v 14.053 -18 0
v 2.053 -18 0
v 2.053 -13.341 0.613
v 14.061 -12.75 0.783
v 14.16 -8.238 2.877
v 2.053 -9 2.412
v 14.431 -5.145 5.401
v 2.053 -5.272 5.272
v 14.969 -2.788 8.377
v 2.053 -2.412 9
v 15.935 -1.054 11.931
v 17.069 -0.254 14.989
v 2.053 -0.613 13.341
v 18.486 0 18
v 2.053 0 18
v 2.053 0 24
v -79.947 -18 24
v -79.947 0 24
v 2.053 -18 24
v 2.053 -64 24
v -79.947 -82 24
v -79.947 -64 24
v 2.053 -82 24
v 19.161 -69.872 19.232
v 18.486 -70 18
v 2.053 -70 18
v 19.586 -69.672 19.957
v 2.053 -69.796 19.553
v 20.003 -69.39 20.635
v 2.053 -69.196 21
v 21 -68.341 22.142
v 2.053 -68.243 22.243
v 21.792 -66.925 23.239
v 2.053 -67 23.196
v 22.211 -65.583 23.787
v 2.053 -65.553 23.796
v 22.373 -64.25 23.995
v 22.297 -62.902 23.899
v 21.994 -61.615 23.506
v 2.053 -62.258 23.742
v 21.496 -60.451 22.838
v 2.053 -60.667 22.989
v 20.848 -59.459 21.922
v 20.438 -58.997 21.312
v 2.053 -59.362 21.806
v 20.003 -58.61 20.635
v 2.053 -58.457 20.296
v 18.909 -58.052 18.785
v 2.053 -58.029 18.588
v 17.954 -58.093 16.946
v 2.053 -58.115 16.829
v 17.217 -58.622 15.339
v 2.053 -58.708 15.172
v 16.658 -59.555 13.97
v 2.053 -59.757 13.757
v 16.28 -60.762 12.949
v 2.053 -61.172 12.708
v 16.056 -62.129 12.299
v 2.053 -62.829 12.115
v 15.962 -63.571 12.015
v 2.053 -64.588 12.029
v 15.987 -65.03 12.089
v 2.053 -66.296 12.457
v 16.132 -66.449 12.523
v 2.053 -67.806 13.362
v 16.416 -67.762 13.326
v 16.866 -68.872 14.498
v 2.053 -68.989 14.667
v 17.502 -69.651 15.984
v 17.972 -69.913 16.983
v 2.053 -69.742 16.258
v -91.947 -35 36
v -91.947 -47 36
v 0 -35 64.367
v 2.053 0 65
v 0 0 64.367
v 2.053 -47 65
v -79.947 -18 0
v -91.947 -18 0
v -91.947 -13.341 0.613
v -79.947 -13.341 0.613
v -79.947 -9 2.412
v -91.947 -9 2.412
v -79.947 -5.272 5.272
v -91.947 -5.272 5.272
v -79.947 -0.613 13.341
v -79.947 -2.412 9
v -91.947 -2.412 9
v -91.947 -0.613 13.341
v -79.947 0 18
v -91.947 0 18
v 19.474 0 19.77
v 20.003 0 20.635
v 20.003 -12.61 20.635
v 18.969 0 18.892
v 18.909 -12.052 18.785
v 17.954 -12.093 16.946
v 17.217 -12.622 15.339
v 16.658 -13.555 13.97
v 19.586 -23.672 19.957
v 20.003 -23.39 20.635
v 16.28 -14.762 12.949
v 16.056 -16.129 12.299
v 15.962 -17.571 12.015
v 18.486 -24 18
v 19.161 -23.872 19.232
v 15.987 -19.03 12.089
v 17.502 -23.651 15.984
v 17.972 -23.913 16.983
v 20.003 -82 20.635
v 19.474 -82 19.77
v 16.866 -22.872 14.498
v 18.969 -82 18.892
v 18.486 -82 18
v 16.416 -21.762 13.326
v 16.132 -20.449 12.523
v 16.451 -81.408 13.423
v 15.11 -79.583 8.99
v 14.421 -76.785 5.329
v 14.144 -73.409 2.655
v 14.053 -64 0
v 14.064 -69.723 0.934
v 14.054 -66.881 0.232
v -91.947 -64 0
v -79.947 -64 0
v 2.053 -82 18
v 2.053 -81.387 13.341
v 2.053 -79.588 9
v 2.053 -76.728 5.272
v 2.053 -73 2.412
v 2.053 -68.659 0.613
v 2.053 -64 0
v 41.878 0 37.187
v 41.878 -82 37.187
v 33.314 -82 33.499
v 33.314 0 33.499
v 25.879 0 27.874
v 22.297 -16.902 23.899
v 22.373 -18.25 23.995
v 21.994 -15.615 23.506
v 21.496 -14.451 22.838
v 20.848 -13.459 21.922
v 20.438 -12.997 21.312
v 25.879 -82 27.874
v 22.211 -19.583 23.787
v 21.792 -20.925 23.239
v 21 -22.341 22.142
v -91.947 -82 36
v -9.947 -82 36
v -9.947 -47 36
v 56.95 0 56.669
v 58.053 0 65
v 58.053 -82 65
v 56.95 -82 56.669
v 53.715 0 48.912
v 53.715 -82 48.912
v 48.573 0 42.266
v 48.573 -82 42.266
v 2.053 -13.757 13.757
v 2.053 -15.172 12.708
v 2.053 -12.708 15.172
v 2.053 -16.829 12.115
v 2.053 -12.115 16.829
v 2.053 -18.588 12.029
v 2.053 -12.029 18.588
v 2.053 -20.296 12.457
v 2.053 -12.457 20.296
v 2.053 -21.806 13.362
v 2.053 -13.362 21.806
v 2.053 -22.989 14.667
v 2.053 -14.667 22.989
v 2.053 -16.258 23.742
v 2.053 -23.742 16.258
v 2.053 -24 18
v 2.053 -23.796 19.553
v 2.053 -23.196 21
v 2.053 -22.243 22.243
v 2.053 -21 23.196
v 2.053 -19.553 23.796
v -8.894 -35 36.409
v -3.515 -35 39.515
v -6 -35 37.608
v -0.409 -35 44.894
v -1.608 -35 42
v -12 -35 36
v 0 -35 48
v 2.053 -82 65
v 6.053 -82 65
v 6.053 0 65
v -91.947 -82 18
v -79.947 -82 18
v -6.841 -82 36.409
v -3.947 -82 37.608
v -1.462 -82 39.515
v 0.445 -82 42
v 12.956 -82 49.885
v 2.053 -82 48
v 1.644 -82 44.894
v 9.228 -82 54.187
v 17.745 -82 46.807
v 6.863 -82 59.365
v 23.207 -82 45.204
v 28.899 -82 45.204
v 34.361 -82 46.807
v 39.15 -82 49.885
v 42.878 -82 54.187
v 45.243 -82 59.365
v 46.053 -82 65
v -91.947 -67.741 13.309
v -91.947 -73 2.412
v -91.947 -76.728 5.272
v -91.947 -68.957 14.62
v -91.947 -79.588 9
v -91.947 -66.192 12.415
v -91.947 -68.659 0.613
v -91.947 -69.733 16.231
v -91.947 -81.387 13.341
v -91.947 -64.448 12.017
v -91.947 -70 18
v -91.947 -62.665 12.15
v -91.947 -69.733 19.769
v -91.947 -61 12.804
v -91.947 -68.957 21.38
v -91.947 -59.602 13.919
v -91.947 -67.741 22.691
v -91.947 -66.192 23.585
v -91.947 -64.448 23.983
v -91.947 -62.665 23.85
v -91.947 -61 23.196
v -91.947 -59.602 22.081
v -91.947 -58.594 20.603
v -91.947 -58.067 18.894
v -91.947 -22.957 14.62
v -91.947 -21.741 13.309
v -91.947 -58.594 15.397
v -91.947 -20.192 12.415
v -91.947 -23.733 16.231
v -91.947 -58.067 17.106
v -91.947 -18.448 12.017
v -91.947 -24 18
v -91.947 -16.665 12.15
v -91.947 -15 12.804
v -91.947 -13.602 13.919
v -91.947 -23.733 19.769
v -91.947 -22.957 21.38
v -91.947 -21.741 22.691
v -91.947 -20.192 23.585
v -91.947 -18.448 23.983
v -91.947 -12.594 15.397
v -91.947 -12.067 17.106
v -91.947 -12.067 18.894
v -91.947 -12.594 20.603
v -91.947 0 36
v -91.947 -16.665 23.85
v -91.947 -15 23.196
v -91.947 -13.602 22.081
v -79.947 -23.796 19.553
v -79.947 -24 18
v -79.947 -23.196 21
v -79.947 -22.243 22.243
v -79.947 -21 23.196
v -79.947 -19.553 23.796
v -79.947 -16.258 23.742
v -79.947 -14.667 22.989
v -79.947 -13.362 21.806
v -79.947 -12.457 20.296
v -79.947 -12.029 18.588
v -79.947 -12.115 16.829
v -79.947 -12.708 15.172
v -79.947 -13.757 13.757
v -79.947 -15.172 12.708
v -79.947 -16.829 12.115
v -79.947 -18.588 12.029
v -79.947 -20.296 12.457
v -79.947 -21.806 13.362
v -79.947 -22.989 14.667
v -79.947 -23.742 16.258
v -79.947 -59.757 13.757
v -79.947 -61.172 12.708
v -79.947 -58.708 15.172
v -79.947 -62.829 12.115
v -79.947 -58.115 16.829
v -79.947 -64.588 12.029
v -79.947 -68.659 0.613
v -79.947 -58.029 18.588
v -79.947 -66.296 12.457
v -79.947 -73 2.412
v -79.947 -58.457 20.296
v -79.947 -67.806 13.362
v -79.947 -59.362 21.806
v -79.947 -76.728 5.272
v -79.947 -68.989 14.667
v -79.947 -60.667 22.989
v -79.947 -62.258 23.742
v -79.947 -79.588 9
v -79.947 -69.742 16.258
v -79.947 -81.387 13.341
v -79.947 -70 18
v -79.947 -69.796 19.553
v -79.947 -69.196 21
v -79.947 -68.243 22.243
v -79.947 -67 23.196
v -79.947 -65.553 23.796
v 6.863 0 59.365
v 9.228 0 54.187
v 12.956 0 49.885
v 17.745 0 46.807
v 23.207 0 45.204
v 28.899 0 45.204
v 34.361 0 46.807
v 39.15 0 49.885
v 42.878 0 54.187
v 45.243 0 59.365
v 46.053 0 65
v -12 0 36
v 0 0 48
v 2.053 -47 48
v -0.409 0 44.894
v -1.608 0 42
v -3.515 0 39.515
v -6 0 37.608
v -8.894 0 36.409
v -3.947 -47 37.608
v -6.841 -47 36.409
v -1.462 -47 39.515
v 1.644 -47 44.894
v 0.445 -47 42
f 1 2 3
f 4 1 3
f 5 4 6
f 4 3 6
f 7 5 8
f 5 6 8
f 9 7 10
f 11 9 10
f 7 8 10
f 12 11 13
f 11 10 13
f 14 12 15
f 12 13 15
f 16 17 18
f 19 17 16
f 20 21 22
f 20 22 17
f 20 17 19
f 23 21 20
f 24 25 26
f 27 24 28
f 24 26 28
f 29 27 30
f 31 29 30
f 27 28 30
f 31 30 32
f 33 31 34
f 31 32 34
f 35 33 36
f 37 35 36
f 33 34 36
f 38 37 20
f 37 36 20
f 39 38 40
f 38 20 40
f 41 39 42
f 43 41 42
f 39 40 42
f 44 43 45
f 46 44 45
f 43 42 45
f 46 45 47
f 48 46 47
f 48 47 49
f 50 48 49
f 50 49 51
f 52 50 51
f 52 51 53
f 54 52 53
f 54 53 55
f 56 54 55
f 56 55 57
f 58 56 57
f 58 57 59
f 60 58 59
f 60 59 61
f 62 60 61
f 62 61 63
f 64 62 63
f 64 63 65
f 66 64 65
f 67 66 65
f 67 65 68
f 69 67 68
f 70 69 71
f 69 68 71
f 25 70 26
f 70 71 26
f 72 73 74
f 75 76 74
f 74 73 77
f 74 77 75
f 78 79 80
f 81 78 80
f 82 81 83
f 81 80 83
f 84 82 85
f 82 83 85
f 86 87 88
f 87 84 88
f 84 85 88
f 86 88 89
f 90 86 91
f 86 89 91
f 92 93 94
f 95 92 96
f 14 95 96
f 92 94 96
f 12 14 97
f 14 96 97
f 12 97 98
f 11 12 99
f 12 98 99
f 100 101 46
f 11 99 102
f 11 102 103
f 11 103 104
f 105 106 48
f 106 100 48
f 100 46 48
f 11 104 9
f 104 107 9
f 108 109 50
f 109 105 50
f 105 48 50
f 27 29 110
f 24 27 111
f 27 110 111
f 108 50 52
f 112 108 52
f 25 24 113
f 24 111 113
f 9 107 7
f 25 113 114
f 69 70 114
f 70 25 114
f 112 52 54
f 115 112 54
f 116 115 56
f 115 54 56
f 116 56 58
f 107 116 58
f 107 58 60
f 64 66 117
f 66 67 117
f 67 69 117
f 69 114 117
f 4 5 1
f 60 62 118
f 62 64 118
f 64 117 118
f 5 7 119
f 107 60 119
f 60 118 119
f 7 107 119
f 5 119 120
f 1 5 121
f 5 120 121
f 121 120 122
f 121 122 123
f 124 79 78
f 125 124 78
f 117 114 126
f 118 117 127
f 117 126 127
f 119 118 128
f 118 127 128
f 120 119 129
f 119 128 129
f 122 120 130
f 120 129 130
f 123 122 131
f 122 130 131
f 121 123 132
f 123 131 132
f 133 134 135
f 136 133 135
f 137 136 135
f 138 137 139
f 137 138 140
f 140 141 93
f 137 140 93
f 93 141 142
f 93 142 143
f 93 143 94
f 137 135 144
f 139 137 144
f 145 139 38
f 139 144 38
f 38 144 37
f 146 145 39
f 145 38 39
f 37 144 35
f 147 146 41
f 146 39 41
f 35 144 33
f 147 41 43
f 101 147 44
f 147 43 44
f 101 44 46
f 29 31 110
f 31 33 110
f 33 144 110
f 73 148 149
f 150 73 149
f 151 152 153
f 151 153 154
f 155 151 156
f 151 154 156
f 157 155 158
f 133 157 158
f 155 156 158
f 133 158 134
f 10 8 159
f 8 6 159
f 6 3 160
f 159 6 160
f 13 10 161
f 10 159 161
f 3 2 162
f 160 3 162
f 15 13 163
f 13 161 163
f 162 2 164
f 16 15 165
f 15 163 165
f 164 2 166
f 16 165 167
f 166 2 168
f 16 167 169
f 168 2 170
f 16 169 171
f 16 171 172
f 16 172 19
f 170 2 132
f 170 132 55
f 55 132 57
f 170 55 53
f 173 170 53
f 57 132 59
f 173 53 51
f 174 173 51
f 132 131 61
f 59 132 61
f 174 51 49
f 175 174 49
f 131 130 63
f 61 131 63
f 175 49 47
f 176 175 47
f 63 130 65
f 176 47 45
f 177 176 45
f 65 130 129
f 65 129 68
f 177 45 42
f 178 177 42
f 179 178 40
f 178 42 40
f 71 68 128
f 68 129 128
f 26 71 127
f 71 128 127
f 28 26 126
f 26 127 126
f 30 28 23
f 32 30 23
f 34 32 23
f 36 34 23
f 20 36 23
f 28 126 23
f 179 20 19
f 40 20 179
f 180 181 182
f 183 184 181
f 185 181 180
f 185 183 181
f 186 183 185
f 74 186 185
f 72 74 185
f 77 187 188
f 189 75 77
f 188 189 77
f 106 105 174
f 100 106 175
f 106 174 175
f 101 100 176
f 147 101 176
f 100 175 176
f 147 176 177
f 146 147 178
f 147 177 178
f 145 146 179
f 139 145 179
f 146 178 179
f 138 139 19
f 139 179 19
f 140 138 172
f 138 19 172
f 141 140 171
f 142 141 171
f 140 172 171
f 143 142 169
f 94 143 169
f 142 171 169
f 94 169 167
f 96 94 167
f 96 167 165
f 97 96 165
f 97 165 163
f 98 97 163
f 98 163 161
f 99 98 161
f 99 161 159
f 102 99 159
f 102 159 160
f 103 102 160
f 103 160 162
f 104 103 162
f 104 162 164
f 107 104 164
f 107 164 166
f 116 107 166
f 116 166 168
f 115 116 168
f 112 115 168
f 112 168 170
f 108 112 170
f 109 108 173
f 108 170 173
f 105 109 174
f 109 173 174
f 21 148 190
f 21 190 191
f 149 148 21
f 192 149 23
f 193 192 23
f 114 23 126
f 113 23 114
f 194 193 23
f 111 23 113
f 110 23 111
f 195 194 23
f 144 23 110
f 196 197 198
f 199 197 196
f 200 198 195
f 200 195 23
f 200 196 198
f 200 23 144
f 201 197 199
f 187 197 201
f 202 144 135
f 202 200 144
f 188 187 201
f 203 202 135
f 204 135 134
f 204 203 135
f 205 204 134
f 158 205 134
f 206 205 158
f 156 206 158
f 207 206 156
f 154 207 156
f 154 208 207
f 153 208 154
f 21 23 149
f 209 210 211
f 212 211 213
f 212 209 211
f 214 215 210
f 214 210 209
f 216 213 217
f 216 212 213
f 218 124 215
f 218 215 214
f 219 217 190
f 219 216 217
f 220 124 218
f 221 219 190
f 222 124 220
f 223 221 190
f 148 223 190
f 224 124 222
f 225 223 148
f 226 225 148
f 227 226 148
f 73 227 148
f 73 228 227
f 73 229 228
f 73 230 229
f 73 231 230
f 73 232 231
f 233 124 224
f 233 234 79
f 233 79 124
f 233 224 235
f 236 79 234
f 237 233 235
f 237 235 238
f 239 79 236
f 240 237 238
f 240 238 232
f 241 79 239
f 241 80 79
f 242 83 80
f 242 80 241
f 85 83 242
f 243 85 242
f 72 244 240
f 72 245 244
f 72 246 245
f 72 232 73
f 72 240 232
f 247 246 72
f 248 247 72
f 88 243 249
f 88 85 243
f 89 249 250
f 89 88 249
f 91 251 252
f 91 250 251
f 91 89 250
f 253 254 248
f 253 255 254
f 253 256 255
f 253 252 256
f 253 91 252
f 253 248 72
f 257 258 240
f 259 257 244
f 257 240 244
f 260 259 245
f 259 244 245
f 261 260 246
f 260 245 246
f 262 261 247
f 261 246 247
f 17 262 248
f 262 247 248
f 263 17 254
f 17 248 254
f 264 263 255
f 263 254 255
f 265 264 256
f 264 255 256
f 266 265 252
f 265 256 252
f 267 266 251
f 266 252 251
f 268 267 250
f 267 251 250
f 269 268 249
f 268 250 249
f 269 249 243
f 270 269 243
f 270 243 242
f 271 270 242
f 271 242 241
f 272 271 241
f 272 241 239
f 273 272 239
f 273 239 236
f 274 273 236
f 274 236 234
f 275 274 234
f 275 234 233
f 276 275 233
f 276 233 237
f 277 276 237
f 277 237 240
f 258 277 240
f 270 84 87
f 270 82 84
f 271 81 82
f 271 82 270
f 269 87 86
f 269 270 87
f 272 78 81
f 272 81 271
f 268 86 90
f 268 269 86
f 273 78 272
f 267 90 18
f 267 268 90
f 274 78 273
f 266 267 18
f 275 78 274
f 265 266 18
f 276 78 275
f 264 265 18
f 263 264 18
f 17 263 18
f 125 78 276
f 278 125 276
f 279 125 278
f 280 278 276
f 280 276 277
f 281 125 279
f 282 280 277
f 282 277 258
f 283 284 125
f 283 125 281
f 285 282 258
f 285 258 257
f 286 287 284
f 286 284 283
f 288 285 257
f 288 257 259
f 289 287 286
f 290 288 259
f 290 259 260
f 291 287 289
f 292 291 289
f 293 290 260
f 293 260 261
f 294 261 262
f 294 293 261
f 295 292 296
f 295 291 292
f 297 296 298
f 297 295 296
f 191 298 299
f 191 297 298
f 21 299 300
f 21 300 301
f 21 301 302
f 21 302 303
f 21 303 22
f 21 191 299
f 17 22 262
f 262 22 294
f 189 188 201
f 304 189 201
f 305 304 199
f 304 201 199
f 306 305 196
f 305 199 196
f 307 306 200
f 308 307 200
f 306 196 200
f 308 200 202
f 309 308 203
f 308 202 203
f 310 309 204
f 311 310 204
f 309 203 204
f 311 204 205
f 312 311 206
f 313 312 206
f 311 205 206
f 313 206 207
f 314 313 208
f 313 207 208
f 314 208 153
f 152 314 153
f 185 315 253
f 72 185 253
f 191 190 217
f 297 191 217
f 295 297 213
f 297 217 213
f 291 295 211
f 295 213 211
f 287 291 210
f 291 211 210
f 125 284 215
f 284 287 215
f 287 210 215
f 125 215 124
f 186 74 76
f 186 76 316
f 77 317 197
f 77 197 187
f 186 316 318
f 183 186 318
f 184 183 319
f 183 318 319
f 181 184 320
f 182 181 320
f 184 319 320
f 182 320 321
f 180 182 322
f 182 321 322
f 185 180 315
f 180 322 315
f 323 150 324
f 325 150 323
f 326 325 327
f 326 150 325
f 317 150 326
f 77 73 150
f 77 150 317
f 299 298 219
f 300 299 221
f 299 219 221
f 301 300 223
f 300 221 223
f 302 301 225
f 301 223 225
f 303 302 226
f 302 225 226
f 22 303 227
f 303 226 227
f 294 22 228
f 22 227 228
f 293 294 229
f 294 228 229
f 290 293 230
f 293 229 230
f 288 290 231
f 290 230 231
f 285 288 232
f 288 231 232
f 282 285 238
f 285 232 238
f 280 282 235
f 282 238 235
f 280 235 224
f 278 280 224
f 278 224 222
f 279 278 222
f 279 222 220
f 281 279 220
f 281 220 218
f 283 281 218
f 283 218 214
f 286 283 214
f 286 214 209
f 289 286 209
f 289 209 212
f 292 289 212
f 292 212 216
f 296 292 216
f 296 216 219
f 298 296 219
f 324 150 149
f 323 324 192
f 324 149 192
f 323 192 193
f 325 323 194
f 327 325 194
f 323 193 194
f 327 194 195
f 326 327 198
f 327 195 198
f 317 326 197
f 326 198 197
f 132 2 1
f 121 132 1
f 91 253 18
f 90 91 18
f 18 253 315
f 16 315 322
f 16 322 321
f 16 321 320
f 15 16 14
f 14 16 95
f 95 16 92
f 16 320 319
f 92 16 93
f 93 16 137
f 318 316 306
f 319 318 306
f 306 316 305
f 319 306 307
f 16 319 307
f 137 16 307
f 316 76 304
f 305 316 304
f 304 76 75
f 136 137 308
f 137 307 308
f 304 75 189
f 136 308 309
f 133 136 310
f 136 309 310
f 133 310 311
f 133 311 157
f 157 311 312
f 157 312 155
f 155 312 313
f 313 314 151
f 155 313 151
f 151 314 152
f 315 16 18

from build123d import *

# Parameters (mm, degrees)
F0_W      = 150
F0_H      = 65
F1_DEPTH  = 82
F10_W     = 82
F10_H     = 24
F2_DEPTH  = 82
F3_DEPTH  = 82
F4_DEPTH  = 82
F5_DEPTH  = 35
F7_DEPTH  = 35
F8_R      = 6
F12_R     = 6
F13_DEPTH = 150
F14_DEPTH = 150
F9_DEPTH  = 82


# Not quite as in the source:
# - a feature names something its author has since deleted; it is built from what else it names


with BuildPart() as f1:
    # F0 (on Front) → F1 (new body)
    with BuildSketch(Plane.XZ):
        with Locations((-16.9468223028, 32.5)):
            Rectangle(F0_W, F0_H)
    extrude(amount=F1_DEPTH)

    # F10 (on face) → F2 (cut)
    with BuildSketch(Plane.XZ.offset(82)):
        with BuildLine():
            ThreePointArc((20.002534413, 20.6353670047), (15.5702030299, 10.7379376133), (14.0531776972, 0))
            Line((14.0531776972, 0), (58.0531776972, 0))
            Line((58.0531776972, 0), (58.0531776972, 65))
            ThreePointArc((58.0531776972, 65), (53.7152597827, 48.9124515634), (41.8776017786, 37.1865571621))
            ThreePointArc((41.8776017786, 37.1865571621), (37.6930401765, 19.9858202792), (20.002534413, 20.6353670047))
        make_face()
        with Locations((-38.9468223028, 12)):
            Rectangle(F10_W, F10_H)
    extrude(amount=-F2_DEPTH, mode=Mode.SUBTRACT)

    # F11 (on face) → F3 (cut)
    with BuildSketch(Plane.XZ.offset(82)):
        Polygon((-91.9468223028, 36), (2.0531776972, 65), (-91.9468223028, 65), align=None)
    extrude(amount=-F3_DEPTH, mode=Mode.SUBTRACT)

    # F11 (on face) → F4 (cut)
    with BuildSketch(Plane.XZ.offset(82)):
        Polygon((-91.9468223028, 36), (2.0531776972, 65), (-91.9468223028, 65), align=None)
    extrude(amount=-F4_DEPTH, mode=Mode.SUBTRACT)

    # F11 (on face) → F5 (cut)
    with BuildSketch(Plane.XZ.offset(82)):
        with BuildLine():
            Line((2.0531776972, 48), (2.0531776972, 65))
            Line((2.0531776972, 65), (-91.9468223028, 36))
            Line((-91.9468223028, 36), (-9.9468223028, 36))
            ThreePointArc((-9.9468223028, 36), (-1.4615409285, 39.5147186258), (2.0531776972, 48))
        make_face()
    extrude(amount=-F5_DEPTH, mode=Mode.SUBTRACT)

    # F6 (on face) → F7 (cut)
    with BuildSketch(Plane(origin=(0, 0, 0), x_dir=(-1, 0, 0), z_dir=(0, 1, 0))):
        with BuildLine():
            Line((12, 36), (91.9468223028, 36))
            Line((91.9468223028, 36), (0, 64.3665728381))
            Line((0, 64.3665728381), (0, 48))
            ThreePointArc((0, 48), (3.5147186258, 39.5147186258), (12, 36))
        make_face()
    extrude(amount=-F7_DEPTH, mode=Mode.SUBTRACT)

    # F8 (on face) + F12 (on face) → F13 (cut)
    with BuildSketch(Plane(origin=(-91.9468223028, 0, 0), x_dir=(0, -1, 0), z_dir=(-1, 0, 0))):
        with Locations((18, 18)):
            Circle(F8_R)
        with Locations((64, 18)):
            Circle(F8_R)
    with BuildSketch(Plane(origin=(-91.9468223028, 0, 0), x_dir=(0, -1, 0), z_dir=(-1, 0, 0))):
        with Locations((18, 18)):
            Circle(F12_R)
    extrude(amount=-F13_DEPTH, mode=Mode.SUBTRACT)

    # F8 (on face) → F14 (cut)
    with BuildSketch(Plane(origin=(-91.9468223028, 0, 0), x_dir=(0, -1, 0), z_dir=(-1, 0, 0))):
        with BuildLine():
            Line((0, 0), (18, 0))
            ThreePointArc((18, 0), (5.2720779386, 5.2720779386), (0, 18))
            Line((0, 18), (0, 0))
        make_face()
        with BuildLine():
            ThreePointArc((82, 18), (76.7279220614, 5.2720779386), (64, 0))
            Line((64, 0), (82, 0))
            Line((82, 0), (82, 18))
        make_face()
    extrude(amount=-F14_DEPTH, mode=Mode.SUBTRACT)

    # F10 (on face) → F9 (cut)
    with BuildSketch(Plane.XZ.offset(82)):
        with BuildLine():
            ThreePointArc((41.8776017786, 37.1865571621), (29.4269949399, 30.9107323053), (20.002534413, 20.6353670047))
            ThreePointArc((20.002534413, 20.6353670047), (37.6930401765, 19.9858202792), (41.8776017786, 37.1865571621))
        make_face()
        with BuildLine():
            ThreePointArc((20.002534413, 20.6353670047), (15.5702030299, 10.7379376133), (14.0531776972, 0))
            Line((14.0531776972, 0), (58.0531776972, 0))
            Line((58.0531776972, 0), (58.0531776972, 65))
            ThreePointArc((58.0531776972, 65), (53.7152597827, 48.9124515634), (41.8776017786, 37.1865571621))
            ThreePointArc((41.8776017786, 37.1865571621), (37.6930401765, 19.9858202792), (20.002534413, 20.6353670047))
        make_face()
        with BuildLine():
            Line((46.0531776972, 65), (6.0531776972, 65))
            ThreePointArc((6.0531776972, 65), (12.5913823165, 50.2087841904), (27.9311842099, 45.0883679338))
            ThreePointArc((27.9311842099, 45.0883679338), (40.8443935069, 51.5382046192), (46.0531776972, 65))
        make_face()
    extrude(amount=-F9_DEPTH, mode=Mode.SUBTRACT)


solid = f1.part
